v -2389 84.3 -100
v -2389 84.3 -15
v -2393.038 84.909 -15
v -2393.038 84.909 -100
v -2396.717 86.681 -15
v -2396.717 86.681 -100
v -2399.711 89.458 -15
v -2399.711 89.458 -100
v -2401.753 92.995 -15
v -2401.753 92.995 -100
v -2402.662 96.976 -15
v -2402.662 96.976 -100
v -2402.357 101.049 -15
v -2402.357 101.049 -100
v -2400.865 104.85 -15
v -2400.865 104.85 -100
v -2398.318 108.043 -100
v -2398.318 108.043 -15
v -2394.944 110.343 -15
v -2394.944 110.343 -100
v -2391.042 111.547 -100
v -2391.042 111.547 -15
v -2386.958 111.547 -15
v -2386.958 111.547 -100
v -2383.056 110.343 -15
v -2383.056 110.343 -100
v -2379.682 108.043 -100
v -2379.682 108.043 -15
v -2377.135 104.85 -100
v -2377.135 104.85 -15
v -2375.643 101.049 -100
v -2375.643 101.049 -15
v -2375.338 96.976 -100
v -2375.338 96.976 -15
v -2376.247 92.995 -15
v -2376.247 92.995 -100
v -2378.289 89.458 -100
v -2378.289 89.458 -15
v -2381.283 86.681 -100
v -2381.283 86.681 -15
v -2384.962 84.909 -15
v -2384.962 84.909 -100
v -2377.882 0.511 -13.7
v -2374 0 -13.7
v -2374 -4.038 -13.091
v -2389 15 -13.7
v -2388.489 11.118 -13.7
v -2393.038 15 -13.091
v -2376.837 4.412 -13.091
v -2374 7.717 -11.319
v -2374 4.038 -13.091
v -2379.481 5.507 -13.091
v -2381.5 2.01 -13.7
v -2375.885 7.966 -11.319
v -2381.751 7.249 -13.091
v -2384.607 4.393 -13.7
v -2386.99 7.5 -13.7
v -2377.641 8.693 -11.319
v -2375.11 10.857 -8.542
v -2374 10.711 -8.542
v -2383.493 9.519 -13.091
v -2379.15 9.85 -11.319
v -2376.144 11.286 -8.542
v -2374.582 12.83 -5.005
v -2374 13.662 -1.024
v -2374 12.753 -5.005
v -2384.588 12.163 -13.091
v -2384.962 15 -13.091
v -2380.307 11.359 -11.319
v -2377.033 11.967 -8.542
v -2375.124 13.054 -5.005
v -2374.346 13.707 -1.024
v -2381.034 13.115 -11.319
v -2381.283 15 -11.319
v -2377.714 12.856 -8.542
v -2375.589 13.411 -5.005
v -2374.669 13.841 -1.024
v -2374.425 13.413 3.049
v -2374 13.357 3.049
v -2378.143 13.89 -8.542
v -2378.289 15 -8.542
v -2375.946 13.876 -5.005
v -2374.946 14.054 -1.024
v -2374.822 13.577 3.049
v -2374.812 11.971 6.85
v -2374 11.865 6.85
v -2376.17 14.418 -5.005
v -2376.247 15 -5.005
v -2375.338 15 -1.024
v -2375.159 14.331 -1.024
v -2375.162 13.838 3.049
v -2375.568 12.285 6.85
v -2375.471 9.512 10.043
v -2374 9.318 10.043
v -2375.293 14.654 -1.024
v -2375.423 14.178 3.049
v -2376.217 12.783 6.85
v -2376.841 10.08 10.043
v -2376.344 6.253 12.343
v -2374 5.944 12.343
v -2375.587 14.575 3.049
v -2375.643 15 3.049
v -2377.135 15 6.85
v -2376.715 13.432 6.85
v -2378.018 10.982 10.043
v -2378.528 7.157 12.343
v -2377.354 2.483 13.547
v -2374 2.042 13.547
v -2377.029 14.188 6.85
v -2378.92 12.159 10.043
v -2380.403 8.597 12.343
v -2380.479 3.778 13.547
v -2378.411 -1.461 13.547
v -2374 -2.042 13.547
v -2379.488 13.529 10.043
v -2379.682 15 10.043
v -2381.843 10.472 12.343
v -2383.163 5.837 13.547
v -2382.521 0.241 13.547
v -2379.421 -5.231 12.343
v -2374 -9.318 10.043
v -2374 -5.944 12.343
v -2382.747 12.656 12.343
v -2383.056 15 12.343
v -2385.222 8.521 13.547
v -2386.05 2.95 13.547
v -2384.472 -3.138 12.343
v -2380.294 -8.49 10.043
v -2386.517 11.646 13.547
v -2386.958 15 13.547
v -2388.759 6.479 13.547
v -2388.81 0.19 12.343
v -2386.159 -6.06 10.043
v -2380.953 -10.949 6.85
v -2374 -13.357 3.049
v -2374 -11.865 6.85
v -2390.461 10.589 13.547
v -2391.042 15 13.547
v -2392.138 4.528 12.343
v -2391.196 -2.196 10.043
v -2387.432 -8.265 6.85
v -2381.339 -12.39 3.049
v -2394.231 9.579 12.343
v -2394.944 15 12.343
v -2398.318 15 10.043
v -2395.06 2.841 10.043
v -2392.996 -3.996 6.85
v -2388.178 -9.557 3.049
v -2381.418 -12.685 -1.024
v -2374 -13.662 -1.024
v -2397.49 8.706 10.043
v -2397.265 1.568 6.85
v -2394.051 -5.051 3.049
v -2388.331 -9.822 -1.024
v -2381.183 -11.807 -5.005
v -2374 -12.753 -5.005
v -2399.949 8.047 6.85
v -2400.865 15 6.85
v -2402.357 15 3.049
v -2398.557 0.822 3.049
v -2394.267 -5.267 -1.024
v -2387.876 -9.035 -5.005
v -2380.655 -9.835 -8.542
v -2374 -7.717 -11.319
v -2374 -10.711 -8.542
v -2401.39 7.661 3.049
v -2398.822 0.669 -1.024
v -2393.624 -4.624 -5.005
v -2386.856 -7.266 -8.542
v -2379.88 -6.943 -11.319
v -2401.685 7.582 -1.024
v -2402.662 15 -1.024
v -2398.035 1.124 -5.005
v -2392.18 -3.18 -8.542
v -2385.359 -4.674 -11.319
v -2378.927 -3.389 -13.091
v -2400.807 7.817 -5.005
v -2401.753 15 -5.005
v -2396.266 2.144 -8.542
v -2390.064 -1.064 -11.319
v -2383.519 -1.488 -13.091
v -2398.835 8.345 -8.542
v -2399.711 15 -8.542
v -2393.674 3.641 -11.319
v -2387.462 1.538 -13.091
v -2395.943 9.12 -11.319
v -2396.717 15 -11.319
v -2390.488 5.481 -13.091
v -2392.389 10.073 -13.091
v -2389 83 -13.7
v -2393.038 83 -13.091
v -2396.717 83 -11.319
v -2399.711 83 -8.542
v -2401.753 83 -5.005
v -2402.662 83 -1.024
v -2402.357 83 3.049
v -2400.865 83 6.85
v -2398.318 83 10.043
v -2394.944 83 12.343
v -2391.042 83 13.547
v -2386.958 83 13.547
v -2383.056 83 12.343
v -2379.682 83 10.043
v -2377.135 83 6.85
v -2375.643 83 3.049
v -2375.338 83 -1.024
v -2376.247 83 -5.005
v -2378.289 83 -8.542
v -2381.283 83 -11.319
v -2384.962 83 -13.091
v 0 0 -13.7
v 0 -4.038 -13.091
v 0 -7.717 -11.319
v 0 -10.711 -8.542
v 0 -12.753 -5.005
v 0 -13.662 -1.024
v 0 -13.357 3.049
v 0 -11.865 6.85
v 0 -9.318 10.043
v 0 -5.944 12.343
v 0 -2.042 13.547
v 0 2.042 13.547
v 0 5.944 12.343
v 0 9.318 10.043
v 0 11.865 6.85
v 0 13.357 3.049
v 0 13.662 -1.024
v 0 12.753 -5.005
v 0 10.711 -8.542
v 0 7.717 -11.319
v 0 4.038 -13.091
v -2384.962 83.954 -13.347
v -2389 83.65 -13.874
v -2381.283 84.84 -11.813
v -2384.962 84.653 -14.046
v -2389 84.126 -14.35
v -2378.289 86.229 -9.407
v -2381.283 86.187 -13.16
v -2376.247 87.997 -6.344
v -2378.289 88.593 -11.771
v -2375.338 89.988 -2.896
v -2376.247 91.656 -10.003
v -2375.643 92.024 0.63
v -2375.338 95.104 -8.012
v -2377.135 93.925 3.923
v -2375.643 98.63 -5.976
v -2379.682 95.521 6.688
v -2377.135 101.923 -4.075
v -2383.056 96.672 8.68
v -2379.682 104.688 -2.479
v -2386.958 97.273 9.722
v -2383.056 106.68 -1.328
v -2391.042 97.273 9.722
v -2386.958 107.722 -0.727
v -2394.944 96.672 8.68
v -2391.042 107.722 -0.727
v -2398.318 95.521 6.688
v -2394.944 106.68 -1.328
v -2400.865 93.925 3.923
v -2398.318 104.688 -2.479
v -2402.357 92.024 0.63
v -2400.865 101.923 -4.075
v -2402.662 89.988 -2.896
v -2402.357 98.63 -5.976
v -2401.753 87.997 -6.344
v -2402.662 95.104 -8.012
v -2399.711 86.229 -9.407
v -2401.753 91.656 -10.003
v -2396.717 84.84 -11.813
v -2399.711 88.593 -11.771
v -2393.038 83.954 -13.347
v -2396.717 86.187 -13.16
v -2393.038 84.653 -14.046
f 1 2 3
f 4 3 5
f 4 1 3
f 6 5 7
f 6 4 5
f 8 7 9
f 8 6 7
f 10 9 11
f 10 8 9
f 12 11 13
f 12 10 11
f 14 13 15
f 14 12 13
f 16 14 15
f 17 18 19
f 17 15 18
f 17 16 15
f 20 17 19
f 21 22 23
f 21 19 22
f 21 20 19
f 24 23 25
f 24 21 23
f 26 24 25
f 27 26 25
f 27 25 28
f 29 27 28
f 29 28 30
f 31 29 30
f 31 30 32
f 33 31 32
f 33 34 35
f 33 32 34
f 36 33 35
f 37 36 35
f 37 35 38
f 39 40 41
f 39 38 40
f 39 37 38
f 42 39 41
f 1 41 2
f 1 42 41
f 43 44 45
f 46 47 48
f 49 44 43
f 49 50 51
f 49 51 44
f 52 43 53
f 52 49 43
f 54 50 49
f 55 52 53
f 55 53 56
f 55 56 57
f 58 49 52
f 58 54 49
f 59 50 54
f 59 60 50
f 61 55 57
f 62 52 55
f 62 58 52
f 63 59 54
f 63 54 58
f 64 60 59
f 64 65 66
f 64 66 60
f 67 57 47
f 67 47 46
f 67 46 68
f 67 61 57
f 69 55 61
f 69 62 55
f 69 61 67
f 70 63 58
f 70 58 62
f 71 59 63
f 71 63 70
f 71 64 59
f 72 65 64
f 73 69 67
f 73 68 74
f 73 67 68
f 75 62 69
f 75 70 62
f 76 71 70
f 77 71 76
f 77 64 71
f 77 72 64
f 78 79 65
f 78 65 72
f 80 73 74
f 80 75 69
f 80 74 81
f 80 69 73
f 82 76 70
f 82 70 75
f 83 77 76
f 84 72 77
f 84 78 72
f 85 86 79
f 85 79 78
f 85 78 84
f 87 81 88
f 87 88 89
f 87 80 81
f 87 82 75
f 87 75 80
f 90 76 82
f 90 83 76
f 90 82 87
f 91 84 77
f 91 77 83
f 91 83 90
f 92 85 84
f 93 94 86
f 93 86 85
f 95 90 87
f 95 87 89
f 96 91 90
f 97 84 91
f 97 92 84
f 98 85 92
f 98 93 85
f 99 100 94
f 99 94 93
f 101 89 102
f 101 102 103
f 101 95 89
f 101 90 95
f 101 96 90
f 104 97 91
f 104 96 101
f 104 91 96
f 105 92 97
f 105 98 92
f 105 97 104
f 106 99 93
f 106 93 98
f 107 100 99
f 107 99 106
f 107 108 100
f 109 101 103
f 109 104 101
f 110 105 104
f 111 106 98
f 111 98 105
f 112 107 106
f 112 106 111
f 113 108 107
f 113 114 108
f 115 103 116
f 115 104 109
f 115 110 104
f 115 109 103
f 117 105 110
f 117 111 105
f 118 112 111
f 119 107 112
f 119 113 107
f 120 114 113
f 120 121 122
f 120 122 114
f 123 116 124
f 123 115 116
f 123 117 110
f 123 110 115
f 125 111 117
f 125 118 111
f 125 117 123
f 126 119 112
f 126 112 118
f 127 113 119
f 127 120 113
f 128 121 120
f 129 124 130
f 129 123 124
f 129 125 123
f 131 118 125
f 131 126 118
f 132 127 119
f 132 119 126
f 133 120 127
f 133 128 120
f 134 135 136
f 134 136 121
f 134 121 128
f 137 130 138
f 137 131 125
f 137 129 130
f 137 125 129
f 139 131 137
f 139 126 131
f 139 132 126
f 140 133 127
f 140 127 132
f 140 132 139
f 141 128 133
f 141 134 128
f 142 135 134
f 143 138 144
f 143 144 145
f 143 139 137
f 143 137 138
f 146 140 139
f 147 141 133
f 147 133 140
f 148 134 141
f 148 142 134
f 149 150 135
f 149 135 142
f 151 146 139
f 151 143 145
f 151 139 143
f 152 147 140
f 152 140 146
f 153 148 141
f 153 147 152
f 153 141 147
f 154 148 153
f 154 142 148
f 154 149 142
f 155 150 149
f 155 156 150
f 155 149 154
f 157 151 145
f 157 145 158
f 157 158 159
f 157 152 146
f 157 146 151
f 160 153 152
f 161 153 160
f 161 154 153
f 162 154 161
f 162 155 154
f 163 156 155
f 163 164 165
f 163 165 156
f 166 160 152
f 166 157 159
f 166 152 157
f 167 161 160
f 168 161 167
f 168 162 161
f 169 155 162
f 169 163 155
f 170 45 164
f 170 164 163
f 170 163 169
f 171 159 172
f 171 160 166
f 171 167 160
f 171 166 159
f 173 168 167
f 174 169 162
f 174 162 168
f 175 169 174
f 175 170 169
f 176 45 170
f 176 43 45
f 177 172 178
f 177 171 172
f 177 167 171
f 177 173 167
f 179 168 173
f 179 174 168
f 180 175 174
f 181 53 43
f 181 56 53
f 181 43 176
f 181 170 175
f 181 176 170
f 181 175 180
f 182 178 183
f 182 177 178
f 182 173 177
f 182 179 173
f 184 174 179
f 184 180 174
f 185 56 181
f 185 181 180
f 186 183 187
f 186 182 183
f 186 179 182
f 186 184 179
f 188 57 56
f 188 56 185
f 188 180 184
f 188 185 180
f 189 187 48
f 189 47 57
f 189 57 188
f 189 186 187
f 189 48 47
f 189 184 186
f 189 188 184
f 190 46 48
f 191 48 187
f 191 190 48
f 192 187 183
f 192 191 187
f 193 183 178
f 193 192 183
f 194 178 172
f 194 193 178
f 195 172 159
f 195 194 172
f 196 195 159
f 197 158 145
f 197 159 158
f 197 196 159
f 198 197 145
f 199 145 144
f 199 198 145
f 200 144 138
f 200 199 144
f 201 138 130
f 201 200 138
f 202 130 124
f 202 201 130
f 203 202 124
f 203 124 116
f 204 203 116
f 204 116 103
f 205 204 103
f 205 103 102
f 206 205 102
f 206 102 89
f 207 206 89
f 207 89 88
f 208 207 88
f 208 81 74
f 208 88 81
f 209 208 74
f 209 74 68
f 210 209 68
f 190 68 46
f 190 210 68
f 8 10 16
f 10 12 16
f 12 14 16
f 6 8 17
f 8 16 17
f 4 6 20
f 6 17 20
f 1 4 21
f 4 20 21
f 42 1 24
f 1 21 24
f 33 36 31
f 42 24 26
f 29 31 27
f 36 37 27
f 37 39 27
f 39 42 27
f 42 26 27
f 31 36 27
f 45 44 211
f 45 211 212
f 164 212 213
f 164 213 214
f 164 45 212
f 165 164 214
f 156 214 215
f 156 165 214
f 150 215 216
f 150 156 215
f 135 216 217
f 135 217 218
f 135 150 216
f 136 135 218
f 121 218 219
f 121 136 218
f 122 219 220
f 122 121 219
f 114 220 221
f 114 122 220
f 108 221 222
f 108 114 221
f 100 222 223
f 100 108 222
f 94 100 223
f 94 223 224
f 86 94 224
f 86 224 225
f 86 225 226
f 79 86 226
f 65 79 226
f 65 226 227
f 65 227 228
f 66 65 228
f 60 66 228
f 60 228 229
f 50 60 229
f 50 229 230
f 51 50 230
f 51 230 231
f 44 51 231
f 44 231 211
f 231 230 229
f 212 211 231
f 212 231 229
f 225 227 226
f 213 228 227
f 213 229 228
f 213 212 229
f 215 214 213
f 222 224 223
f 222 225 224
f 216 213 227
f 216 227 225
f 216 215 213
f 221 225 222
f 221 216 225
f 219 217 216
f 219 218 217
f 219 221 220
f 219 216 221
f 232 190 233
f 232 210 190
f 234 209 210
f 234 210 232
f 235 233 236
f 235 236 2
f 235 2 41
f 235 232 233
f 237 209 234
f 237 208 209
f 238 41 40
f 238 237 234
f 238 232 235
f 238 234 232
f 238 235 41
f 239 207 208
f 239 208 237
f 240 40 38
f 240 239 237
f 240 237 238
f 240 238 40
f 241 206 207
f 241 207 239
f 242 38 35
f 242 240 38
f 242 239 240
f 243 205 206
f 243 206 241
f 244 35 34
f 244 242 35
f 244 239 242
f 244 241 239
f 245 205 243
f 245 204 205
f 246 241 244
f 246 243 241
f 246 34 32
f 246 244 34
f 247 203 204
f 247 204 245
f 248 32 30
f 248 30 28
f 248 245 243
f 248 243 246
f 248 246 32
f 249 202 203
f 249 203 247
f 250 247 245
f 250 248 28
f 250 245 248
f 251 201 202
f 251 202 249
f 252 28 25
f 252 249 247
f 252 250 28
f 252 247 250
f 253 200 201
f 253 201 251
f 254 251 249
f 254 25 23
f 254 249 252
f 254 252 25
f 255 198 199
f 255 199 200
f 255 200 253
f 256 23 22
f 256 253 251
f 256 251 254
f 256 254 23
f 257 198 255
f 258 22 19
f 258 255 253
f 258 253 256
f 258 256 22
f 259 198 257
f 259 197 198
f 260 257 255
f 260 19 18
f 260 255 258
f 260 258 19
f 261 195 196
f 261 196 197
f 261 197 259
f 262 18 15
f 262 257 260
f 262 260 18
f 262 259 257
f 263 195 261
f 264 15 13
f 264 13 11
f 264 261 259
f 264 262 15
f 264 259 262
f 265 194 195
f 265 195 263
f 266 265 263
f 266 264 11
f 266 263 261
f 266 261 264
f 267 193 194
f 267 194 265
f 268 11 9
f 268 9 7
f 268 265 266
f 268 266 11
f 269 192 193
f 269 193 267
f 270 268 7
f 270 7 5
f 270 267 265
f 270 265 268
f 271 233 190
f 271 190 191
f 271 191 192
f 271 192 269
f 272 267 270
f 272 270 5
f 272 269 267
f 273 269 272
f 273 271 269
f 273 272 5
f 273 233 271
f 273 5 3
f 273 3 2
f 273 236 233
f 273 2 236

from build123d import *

# Parameters (mm, degrees)
CROQUIS1_R = 13.7


with BuildPart() as part:
    # Barrer1: sweep along a curve in space
    with BuildLine() as barrer1_path:
        Line((0, 0, 0), (-2374, 0, 0))
        ThreePointArc((-2374, 0, 0), (-2384.606601718, 4.393398282, 0), (-2389, 15, 0))
        Line((-2389, 15, 0), (-2389, 83, 0))
        ThreePointArc((-2389, 83, 0), (-2389, 93.606601718, -4.393398282), (-2389, 98, -15))
        Line((-2389, 98, -15), (-2389, 98, -100))
    # Croquis1 → Barrer1 (sweep)
    with BuildSketch(Plane(origin=(0, 0, 0), x_dir=(0, 0, -1), z_dir=(1, 0, 0))):
        Circle(CROQUIS1_R)
    sweep(path=barrer1_path.line)


solid = part.part
